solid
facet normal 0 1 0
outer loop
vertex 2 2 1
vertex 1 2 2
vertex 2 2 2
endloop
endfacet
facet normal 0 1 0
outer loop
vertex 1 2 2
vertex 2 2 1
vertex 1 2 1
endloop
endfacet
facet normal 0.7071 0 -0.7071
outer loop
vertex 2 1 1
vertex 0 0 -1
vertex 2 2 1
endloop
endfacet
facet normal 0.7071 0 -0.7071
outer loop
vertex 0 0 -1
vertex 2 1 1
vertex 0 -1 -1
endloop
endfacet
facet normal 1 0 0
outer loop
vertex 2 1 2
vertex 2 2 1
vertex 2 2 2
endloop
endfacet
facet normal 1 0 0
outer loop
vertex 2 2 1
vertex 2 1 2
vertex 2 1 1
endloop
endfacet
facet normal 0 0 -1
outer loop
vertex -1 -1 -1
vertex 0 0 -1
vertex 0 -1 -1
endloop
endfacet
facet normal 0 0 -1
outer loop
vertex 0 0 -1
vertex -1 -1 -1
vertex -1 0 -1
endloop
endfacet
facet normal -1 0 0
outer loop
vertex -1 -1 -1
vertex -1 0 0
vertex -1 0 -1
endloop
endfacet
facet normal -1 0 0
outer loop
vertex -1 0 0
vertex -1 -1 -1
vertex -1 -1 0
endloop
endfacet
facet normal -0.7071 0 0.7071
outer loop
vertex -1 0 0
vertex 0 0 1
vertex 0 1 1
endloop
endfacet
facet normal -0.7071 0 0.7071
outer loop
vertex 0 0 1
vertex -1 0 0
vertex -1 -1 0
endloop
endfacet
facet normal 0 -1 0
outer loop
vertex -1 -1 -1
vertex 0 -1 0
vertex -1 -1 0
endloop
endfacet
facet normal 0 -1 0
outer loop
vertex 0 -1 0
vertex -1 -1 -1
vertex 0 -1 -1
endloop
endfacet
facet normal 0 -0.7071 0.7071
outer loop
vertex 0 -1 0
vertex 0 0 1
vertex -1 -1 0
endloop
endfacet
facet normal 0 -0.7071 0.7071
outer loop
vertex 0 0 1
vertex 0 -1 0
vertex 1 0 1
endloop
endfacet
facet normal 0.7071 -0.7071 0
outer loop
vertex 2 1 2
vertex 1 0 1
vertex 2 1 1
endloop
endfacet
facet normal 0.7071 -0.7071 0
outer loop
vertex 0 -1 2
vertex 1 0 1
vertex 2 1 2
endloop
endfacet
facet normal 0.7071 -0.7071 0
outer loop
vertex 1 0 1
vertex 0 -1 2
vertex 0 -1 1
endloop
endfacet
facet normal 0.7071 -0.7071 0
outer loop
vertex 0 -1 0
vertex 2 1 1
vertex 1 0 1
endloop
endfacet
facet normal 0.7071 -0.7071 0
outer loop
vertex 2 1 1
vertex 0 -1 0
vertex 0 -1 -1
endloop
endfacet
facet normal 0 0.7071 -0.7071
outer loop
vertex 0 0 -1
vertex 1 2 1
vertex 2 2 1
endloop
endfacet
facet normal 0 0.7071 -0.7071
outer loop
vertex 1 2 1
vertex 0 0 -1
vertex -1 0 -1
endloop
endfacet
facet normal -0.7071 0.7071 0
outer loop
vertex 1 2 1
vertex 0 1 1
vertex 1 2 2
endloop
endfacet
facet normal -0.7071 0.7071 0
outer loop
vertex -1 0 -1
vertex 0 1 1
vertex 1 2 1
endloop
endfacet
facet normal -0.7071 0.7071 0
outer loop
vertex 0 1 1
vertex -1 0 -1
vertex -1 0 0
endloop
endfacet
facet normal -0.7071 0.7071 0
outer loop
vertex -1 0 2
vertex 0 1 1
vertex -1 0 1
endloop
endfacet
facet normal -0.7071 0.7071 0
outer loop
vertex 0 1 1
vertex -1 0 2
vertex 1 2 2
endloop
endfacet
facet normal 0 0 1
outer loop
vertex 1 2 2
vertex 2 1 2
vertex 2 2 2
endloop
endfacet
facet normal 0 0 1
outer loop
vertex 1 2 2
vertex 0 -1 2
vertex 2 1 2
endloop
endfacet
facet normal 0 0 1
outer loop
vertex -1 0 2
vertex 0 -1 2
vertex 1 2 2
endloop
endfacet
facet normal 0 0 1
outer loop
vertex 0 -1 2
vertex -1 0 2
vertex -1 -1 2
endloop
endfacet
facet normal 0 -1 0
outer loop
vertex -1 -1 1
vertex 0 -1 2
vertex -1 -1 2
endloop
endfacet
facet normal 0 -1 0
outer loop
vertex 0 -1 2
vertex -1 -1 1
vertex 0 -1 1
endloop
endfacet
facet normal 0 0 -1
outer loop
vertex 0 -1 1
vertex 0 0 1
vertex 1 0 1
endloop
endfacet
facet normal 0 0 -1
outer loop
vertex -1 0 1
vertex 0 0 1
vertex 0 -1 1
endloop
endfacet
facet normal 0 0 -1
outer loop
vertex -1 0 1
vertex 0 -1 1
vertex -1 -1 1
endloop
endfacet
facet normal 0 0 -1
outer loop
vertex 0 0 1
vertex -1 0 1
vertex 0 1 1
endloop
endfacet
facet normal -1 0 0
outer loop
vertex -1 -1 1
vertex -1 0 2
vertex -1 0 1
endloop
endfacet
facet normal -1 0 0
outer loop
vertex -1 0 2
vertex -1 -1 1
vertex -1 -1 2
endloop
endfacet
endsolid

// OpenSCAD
connect_in_sequence()
{
    translate([-1,-1,-1])
    cube(1);
    
    translate([1,1,1])
    cube(1);
    
    translate([-1,-1,1])
    cube(1);
};

module connect_in_sequence()
{
    for(i=[0:1:$children-2])
    {
        hull()
        {
            children(i);
            children(i+1);
        }
    }
}
